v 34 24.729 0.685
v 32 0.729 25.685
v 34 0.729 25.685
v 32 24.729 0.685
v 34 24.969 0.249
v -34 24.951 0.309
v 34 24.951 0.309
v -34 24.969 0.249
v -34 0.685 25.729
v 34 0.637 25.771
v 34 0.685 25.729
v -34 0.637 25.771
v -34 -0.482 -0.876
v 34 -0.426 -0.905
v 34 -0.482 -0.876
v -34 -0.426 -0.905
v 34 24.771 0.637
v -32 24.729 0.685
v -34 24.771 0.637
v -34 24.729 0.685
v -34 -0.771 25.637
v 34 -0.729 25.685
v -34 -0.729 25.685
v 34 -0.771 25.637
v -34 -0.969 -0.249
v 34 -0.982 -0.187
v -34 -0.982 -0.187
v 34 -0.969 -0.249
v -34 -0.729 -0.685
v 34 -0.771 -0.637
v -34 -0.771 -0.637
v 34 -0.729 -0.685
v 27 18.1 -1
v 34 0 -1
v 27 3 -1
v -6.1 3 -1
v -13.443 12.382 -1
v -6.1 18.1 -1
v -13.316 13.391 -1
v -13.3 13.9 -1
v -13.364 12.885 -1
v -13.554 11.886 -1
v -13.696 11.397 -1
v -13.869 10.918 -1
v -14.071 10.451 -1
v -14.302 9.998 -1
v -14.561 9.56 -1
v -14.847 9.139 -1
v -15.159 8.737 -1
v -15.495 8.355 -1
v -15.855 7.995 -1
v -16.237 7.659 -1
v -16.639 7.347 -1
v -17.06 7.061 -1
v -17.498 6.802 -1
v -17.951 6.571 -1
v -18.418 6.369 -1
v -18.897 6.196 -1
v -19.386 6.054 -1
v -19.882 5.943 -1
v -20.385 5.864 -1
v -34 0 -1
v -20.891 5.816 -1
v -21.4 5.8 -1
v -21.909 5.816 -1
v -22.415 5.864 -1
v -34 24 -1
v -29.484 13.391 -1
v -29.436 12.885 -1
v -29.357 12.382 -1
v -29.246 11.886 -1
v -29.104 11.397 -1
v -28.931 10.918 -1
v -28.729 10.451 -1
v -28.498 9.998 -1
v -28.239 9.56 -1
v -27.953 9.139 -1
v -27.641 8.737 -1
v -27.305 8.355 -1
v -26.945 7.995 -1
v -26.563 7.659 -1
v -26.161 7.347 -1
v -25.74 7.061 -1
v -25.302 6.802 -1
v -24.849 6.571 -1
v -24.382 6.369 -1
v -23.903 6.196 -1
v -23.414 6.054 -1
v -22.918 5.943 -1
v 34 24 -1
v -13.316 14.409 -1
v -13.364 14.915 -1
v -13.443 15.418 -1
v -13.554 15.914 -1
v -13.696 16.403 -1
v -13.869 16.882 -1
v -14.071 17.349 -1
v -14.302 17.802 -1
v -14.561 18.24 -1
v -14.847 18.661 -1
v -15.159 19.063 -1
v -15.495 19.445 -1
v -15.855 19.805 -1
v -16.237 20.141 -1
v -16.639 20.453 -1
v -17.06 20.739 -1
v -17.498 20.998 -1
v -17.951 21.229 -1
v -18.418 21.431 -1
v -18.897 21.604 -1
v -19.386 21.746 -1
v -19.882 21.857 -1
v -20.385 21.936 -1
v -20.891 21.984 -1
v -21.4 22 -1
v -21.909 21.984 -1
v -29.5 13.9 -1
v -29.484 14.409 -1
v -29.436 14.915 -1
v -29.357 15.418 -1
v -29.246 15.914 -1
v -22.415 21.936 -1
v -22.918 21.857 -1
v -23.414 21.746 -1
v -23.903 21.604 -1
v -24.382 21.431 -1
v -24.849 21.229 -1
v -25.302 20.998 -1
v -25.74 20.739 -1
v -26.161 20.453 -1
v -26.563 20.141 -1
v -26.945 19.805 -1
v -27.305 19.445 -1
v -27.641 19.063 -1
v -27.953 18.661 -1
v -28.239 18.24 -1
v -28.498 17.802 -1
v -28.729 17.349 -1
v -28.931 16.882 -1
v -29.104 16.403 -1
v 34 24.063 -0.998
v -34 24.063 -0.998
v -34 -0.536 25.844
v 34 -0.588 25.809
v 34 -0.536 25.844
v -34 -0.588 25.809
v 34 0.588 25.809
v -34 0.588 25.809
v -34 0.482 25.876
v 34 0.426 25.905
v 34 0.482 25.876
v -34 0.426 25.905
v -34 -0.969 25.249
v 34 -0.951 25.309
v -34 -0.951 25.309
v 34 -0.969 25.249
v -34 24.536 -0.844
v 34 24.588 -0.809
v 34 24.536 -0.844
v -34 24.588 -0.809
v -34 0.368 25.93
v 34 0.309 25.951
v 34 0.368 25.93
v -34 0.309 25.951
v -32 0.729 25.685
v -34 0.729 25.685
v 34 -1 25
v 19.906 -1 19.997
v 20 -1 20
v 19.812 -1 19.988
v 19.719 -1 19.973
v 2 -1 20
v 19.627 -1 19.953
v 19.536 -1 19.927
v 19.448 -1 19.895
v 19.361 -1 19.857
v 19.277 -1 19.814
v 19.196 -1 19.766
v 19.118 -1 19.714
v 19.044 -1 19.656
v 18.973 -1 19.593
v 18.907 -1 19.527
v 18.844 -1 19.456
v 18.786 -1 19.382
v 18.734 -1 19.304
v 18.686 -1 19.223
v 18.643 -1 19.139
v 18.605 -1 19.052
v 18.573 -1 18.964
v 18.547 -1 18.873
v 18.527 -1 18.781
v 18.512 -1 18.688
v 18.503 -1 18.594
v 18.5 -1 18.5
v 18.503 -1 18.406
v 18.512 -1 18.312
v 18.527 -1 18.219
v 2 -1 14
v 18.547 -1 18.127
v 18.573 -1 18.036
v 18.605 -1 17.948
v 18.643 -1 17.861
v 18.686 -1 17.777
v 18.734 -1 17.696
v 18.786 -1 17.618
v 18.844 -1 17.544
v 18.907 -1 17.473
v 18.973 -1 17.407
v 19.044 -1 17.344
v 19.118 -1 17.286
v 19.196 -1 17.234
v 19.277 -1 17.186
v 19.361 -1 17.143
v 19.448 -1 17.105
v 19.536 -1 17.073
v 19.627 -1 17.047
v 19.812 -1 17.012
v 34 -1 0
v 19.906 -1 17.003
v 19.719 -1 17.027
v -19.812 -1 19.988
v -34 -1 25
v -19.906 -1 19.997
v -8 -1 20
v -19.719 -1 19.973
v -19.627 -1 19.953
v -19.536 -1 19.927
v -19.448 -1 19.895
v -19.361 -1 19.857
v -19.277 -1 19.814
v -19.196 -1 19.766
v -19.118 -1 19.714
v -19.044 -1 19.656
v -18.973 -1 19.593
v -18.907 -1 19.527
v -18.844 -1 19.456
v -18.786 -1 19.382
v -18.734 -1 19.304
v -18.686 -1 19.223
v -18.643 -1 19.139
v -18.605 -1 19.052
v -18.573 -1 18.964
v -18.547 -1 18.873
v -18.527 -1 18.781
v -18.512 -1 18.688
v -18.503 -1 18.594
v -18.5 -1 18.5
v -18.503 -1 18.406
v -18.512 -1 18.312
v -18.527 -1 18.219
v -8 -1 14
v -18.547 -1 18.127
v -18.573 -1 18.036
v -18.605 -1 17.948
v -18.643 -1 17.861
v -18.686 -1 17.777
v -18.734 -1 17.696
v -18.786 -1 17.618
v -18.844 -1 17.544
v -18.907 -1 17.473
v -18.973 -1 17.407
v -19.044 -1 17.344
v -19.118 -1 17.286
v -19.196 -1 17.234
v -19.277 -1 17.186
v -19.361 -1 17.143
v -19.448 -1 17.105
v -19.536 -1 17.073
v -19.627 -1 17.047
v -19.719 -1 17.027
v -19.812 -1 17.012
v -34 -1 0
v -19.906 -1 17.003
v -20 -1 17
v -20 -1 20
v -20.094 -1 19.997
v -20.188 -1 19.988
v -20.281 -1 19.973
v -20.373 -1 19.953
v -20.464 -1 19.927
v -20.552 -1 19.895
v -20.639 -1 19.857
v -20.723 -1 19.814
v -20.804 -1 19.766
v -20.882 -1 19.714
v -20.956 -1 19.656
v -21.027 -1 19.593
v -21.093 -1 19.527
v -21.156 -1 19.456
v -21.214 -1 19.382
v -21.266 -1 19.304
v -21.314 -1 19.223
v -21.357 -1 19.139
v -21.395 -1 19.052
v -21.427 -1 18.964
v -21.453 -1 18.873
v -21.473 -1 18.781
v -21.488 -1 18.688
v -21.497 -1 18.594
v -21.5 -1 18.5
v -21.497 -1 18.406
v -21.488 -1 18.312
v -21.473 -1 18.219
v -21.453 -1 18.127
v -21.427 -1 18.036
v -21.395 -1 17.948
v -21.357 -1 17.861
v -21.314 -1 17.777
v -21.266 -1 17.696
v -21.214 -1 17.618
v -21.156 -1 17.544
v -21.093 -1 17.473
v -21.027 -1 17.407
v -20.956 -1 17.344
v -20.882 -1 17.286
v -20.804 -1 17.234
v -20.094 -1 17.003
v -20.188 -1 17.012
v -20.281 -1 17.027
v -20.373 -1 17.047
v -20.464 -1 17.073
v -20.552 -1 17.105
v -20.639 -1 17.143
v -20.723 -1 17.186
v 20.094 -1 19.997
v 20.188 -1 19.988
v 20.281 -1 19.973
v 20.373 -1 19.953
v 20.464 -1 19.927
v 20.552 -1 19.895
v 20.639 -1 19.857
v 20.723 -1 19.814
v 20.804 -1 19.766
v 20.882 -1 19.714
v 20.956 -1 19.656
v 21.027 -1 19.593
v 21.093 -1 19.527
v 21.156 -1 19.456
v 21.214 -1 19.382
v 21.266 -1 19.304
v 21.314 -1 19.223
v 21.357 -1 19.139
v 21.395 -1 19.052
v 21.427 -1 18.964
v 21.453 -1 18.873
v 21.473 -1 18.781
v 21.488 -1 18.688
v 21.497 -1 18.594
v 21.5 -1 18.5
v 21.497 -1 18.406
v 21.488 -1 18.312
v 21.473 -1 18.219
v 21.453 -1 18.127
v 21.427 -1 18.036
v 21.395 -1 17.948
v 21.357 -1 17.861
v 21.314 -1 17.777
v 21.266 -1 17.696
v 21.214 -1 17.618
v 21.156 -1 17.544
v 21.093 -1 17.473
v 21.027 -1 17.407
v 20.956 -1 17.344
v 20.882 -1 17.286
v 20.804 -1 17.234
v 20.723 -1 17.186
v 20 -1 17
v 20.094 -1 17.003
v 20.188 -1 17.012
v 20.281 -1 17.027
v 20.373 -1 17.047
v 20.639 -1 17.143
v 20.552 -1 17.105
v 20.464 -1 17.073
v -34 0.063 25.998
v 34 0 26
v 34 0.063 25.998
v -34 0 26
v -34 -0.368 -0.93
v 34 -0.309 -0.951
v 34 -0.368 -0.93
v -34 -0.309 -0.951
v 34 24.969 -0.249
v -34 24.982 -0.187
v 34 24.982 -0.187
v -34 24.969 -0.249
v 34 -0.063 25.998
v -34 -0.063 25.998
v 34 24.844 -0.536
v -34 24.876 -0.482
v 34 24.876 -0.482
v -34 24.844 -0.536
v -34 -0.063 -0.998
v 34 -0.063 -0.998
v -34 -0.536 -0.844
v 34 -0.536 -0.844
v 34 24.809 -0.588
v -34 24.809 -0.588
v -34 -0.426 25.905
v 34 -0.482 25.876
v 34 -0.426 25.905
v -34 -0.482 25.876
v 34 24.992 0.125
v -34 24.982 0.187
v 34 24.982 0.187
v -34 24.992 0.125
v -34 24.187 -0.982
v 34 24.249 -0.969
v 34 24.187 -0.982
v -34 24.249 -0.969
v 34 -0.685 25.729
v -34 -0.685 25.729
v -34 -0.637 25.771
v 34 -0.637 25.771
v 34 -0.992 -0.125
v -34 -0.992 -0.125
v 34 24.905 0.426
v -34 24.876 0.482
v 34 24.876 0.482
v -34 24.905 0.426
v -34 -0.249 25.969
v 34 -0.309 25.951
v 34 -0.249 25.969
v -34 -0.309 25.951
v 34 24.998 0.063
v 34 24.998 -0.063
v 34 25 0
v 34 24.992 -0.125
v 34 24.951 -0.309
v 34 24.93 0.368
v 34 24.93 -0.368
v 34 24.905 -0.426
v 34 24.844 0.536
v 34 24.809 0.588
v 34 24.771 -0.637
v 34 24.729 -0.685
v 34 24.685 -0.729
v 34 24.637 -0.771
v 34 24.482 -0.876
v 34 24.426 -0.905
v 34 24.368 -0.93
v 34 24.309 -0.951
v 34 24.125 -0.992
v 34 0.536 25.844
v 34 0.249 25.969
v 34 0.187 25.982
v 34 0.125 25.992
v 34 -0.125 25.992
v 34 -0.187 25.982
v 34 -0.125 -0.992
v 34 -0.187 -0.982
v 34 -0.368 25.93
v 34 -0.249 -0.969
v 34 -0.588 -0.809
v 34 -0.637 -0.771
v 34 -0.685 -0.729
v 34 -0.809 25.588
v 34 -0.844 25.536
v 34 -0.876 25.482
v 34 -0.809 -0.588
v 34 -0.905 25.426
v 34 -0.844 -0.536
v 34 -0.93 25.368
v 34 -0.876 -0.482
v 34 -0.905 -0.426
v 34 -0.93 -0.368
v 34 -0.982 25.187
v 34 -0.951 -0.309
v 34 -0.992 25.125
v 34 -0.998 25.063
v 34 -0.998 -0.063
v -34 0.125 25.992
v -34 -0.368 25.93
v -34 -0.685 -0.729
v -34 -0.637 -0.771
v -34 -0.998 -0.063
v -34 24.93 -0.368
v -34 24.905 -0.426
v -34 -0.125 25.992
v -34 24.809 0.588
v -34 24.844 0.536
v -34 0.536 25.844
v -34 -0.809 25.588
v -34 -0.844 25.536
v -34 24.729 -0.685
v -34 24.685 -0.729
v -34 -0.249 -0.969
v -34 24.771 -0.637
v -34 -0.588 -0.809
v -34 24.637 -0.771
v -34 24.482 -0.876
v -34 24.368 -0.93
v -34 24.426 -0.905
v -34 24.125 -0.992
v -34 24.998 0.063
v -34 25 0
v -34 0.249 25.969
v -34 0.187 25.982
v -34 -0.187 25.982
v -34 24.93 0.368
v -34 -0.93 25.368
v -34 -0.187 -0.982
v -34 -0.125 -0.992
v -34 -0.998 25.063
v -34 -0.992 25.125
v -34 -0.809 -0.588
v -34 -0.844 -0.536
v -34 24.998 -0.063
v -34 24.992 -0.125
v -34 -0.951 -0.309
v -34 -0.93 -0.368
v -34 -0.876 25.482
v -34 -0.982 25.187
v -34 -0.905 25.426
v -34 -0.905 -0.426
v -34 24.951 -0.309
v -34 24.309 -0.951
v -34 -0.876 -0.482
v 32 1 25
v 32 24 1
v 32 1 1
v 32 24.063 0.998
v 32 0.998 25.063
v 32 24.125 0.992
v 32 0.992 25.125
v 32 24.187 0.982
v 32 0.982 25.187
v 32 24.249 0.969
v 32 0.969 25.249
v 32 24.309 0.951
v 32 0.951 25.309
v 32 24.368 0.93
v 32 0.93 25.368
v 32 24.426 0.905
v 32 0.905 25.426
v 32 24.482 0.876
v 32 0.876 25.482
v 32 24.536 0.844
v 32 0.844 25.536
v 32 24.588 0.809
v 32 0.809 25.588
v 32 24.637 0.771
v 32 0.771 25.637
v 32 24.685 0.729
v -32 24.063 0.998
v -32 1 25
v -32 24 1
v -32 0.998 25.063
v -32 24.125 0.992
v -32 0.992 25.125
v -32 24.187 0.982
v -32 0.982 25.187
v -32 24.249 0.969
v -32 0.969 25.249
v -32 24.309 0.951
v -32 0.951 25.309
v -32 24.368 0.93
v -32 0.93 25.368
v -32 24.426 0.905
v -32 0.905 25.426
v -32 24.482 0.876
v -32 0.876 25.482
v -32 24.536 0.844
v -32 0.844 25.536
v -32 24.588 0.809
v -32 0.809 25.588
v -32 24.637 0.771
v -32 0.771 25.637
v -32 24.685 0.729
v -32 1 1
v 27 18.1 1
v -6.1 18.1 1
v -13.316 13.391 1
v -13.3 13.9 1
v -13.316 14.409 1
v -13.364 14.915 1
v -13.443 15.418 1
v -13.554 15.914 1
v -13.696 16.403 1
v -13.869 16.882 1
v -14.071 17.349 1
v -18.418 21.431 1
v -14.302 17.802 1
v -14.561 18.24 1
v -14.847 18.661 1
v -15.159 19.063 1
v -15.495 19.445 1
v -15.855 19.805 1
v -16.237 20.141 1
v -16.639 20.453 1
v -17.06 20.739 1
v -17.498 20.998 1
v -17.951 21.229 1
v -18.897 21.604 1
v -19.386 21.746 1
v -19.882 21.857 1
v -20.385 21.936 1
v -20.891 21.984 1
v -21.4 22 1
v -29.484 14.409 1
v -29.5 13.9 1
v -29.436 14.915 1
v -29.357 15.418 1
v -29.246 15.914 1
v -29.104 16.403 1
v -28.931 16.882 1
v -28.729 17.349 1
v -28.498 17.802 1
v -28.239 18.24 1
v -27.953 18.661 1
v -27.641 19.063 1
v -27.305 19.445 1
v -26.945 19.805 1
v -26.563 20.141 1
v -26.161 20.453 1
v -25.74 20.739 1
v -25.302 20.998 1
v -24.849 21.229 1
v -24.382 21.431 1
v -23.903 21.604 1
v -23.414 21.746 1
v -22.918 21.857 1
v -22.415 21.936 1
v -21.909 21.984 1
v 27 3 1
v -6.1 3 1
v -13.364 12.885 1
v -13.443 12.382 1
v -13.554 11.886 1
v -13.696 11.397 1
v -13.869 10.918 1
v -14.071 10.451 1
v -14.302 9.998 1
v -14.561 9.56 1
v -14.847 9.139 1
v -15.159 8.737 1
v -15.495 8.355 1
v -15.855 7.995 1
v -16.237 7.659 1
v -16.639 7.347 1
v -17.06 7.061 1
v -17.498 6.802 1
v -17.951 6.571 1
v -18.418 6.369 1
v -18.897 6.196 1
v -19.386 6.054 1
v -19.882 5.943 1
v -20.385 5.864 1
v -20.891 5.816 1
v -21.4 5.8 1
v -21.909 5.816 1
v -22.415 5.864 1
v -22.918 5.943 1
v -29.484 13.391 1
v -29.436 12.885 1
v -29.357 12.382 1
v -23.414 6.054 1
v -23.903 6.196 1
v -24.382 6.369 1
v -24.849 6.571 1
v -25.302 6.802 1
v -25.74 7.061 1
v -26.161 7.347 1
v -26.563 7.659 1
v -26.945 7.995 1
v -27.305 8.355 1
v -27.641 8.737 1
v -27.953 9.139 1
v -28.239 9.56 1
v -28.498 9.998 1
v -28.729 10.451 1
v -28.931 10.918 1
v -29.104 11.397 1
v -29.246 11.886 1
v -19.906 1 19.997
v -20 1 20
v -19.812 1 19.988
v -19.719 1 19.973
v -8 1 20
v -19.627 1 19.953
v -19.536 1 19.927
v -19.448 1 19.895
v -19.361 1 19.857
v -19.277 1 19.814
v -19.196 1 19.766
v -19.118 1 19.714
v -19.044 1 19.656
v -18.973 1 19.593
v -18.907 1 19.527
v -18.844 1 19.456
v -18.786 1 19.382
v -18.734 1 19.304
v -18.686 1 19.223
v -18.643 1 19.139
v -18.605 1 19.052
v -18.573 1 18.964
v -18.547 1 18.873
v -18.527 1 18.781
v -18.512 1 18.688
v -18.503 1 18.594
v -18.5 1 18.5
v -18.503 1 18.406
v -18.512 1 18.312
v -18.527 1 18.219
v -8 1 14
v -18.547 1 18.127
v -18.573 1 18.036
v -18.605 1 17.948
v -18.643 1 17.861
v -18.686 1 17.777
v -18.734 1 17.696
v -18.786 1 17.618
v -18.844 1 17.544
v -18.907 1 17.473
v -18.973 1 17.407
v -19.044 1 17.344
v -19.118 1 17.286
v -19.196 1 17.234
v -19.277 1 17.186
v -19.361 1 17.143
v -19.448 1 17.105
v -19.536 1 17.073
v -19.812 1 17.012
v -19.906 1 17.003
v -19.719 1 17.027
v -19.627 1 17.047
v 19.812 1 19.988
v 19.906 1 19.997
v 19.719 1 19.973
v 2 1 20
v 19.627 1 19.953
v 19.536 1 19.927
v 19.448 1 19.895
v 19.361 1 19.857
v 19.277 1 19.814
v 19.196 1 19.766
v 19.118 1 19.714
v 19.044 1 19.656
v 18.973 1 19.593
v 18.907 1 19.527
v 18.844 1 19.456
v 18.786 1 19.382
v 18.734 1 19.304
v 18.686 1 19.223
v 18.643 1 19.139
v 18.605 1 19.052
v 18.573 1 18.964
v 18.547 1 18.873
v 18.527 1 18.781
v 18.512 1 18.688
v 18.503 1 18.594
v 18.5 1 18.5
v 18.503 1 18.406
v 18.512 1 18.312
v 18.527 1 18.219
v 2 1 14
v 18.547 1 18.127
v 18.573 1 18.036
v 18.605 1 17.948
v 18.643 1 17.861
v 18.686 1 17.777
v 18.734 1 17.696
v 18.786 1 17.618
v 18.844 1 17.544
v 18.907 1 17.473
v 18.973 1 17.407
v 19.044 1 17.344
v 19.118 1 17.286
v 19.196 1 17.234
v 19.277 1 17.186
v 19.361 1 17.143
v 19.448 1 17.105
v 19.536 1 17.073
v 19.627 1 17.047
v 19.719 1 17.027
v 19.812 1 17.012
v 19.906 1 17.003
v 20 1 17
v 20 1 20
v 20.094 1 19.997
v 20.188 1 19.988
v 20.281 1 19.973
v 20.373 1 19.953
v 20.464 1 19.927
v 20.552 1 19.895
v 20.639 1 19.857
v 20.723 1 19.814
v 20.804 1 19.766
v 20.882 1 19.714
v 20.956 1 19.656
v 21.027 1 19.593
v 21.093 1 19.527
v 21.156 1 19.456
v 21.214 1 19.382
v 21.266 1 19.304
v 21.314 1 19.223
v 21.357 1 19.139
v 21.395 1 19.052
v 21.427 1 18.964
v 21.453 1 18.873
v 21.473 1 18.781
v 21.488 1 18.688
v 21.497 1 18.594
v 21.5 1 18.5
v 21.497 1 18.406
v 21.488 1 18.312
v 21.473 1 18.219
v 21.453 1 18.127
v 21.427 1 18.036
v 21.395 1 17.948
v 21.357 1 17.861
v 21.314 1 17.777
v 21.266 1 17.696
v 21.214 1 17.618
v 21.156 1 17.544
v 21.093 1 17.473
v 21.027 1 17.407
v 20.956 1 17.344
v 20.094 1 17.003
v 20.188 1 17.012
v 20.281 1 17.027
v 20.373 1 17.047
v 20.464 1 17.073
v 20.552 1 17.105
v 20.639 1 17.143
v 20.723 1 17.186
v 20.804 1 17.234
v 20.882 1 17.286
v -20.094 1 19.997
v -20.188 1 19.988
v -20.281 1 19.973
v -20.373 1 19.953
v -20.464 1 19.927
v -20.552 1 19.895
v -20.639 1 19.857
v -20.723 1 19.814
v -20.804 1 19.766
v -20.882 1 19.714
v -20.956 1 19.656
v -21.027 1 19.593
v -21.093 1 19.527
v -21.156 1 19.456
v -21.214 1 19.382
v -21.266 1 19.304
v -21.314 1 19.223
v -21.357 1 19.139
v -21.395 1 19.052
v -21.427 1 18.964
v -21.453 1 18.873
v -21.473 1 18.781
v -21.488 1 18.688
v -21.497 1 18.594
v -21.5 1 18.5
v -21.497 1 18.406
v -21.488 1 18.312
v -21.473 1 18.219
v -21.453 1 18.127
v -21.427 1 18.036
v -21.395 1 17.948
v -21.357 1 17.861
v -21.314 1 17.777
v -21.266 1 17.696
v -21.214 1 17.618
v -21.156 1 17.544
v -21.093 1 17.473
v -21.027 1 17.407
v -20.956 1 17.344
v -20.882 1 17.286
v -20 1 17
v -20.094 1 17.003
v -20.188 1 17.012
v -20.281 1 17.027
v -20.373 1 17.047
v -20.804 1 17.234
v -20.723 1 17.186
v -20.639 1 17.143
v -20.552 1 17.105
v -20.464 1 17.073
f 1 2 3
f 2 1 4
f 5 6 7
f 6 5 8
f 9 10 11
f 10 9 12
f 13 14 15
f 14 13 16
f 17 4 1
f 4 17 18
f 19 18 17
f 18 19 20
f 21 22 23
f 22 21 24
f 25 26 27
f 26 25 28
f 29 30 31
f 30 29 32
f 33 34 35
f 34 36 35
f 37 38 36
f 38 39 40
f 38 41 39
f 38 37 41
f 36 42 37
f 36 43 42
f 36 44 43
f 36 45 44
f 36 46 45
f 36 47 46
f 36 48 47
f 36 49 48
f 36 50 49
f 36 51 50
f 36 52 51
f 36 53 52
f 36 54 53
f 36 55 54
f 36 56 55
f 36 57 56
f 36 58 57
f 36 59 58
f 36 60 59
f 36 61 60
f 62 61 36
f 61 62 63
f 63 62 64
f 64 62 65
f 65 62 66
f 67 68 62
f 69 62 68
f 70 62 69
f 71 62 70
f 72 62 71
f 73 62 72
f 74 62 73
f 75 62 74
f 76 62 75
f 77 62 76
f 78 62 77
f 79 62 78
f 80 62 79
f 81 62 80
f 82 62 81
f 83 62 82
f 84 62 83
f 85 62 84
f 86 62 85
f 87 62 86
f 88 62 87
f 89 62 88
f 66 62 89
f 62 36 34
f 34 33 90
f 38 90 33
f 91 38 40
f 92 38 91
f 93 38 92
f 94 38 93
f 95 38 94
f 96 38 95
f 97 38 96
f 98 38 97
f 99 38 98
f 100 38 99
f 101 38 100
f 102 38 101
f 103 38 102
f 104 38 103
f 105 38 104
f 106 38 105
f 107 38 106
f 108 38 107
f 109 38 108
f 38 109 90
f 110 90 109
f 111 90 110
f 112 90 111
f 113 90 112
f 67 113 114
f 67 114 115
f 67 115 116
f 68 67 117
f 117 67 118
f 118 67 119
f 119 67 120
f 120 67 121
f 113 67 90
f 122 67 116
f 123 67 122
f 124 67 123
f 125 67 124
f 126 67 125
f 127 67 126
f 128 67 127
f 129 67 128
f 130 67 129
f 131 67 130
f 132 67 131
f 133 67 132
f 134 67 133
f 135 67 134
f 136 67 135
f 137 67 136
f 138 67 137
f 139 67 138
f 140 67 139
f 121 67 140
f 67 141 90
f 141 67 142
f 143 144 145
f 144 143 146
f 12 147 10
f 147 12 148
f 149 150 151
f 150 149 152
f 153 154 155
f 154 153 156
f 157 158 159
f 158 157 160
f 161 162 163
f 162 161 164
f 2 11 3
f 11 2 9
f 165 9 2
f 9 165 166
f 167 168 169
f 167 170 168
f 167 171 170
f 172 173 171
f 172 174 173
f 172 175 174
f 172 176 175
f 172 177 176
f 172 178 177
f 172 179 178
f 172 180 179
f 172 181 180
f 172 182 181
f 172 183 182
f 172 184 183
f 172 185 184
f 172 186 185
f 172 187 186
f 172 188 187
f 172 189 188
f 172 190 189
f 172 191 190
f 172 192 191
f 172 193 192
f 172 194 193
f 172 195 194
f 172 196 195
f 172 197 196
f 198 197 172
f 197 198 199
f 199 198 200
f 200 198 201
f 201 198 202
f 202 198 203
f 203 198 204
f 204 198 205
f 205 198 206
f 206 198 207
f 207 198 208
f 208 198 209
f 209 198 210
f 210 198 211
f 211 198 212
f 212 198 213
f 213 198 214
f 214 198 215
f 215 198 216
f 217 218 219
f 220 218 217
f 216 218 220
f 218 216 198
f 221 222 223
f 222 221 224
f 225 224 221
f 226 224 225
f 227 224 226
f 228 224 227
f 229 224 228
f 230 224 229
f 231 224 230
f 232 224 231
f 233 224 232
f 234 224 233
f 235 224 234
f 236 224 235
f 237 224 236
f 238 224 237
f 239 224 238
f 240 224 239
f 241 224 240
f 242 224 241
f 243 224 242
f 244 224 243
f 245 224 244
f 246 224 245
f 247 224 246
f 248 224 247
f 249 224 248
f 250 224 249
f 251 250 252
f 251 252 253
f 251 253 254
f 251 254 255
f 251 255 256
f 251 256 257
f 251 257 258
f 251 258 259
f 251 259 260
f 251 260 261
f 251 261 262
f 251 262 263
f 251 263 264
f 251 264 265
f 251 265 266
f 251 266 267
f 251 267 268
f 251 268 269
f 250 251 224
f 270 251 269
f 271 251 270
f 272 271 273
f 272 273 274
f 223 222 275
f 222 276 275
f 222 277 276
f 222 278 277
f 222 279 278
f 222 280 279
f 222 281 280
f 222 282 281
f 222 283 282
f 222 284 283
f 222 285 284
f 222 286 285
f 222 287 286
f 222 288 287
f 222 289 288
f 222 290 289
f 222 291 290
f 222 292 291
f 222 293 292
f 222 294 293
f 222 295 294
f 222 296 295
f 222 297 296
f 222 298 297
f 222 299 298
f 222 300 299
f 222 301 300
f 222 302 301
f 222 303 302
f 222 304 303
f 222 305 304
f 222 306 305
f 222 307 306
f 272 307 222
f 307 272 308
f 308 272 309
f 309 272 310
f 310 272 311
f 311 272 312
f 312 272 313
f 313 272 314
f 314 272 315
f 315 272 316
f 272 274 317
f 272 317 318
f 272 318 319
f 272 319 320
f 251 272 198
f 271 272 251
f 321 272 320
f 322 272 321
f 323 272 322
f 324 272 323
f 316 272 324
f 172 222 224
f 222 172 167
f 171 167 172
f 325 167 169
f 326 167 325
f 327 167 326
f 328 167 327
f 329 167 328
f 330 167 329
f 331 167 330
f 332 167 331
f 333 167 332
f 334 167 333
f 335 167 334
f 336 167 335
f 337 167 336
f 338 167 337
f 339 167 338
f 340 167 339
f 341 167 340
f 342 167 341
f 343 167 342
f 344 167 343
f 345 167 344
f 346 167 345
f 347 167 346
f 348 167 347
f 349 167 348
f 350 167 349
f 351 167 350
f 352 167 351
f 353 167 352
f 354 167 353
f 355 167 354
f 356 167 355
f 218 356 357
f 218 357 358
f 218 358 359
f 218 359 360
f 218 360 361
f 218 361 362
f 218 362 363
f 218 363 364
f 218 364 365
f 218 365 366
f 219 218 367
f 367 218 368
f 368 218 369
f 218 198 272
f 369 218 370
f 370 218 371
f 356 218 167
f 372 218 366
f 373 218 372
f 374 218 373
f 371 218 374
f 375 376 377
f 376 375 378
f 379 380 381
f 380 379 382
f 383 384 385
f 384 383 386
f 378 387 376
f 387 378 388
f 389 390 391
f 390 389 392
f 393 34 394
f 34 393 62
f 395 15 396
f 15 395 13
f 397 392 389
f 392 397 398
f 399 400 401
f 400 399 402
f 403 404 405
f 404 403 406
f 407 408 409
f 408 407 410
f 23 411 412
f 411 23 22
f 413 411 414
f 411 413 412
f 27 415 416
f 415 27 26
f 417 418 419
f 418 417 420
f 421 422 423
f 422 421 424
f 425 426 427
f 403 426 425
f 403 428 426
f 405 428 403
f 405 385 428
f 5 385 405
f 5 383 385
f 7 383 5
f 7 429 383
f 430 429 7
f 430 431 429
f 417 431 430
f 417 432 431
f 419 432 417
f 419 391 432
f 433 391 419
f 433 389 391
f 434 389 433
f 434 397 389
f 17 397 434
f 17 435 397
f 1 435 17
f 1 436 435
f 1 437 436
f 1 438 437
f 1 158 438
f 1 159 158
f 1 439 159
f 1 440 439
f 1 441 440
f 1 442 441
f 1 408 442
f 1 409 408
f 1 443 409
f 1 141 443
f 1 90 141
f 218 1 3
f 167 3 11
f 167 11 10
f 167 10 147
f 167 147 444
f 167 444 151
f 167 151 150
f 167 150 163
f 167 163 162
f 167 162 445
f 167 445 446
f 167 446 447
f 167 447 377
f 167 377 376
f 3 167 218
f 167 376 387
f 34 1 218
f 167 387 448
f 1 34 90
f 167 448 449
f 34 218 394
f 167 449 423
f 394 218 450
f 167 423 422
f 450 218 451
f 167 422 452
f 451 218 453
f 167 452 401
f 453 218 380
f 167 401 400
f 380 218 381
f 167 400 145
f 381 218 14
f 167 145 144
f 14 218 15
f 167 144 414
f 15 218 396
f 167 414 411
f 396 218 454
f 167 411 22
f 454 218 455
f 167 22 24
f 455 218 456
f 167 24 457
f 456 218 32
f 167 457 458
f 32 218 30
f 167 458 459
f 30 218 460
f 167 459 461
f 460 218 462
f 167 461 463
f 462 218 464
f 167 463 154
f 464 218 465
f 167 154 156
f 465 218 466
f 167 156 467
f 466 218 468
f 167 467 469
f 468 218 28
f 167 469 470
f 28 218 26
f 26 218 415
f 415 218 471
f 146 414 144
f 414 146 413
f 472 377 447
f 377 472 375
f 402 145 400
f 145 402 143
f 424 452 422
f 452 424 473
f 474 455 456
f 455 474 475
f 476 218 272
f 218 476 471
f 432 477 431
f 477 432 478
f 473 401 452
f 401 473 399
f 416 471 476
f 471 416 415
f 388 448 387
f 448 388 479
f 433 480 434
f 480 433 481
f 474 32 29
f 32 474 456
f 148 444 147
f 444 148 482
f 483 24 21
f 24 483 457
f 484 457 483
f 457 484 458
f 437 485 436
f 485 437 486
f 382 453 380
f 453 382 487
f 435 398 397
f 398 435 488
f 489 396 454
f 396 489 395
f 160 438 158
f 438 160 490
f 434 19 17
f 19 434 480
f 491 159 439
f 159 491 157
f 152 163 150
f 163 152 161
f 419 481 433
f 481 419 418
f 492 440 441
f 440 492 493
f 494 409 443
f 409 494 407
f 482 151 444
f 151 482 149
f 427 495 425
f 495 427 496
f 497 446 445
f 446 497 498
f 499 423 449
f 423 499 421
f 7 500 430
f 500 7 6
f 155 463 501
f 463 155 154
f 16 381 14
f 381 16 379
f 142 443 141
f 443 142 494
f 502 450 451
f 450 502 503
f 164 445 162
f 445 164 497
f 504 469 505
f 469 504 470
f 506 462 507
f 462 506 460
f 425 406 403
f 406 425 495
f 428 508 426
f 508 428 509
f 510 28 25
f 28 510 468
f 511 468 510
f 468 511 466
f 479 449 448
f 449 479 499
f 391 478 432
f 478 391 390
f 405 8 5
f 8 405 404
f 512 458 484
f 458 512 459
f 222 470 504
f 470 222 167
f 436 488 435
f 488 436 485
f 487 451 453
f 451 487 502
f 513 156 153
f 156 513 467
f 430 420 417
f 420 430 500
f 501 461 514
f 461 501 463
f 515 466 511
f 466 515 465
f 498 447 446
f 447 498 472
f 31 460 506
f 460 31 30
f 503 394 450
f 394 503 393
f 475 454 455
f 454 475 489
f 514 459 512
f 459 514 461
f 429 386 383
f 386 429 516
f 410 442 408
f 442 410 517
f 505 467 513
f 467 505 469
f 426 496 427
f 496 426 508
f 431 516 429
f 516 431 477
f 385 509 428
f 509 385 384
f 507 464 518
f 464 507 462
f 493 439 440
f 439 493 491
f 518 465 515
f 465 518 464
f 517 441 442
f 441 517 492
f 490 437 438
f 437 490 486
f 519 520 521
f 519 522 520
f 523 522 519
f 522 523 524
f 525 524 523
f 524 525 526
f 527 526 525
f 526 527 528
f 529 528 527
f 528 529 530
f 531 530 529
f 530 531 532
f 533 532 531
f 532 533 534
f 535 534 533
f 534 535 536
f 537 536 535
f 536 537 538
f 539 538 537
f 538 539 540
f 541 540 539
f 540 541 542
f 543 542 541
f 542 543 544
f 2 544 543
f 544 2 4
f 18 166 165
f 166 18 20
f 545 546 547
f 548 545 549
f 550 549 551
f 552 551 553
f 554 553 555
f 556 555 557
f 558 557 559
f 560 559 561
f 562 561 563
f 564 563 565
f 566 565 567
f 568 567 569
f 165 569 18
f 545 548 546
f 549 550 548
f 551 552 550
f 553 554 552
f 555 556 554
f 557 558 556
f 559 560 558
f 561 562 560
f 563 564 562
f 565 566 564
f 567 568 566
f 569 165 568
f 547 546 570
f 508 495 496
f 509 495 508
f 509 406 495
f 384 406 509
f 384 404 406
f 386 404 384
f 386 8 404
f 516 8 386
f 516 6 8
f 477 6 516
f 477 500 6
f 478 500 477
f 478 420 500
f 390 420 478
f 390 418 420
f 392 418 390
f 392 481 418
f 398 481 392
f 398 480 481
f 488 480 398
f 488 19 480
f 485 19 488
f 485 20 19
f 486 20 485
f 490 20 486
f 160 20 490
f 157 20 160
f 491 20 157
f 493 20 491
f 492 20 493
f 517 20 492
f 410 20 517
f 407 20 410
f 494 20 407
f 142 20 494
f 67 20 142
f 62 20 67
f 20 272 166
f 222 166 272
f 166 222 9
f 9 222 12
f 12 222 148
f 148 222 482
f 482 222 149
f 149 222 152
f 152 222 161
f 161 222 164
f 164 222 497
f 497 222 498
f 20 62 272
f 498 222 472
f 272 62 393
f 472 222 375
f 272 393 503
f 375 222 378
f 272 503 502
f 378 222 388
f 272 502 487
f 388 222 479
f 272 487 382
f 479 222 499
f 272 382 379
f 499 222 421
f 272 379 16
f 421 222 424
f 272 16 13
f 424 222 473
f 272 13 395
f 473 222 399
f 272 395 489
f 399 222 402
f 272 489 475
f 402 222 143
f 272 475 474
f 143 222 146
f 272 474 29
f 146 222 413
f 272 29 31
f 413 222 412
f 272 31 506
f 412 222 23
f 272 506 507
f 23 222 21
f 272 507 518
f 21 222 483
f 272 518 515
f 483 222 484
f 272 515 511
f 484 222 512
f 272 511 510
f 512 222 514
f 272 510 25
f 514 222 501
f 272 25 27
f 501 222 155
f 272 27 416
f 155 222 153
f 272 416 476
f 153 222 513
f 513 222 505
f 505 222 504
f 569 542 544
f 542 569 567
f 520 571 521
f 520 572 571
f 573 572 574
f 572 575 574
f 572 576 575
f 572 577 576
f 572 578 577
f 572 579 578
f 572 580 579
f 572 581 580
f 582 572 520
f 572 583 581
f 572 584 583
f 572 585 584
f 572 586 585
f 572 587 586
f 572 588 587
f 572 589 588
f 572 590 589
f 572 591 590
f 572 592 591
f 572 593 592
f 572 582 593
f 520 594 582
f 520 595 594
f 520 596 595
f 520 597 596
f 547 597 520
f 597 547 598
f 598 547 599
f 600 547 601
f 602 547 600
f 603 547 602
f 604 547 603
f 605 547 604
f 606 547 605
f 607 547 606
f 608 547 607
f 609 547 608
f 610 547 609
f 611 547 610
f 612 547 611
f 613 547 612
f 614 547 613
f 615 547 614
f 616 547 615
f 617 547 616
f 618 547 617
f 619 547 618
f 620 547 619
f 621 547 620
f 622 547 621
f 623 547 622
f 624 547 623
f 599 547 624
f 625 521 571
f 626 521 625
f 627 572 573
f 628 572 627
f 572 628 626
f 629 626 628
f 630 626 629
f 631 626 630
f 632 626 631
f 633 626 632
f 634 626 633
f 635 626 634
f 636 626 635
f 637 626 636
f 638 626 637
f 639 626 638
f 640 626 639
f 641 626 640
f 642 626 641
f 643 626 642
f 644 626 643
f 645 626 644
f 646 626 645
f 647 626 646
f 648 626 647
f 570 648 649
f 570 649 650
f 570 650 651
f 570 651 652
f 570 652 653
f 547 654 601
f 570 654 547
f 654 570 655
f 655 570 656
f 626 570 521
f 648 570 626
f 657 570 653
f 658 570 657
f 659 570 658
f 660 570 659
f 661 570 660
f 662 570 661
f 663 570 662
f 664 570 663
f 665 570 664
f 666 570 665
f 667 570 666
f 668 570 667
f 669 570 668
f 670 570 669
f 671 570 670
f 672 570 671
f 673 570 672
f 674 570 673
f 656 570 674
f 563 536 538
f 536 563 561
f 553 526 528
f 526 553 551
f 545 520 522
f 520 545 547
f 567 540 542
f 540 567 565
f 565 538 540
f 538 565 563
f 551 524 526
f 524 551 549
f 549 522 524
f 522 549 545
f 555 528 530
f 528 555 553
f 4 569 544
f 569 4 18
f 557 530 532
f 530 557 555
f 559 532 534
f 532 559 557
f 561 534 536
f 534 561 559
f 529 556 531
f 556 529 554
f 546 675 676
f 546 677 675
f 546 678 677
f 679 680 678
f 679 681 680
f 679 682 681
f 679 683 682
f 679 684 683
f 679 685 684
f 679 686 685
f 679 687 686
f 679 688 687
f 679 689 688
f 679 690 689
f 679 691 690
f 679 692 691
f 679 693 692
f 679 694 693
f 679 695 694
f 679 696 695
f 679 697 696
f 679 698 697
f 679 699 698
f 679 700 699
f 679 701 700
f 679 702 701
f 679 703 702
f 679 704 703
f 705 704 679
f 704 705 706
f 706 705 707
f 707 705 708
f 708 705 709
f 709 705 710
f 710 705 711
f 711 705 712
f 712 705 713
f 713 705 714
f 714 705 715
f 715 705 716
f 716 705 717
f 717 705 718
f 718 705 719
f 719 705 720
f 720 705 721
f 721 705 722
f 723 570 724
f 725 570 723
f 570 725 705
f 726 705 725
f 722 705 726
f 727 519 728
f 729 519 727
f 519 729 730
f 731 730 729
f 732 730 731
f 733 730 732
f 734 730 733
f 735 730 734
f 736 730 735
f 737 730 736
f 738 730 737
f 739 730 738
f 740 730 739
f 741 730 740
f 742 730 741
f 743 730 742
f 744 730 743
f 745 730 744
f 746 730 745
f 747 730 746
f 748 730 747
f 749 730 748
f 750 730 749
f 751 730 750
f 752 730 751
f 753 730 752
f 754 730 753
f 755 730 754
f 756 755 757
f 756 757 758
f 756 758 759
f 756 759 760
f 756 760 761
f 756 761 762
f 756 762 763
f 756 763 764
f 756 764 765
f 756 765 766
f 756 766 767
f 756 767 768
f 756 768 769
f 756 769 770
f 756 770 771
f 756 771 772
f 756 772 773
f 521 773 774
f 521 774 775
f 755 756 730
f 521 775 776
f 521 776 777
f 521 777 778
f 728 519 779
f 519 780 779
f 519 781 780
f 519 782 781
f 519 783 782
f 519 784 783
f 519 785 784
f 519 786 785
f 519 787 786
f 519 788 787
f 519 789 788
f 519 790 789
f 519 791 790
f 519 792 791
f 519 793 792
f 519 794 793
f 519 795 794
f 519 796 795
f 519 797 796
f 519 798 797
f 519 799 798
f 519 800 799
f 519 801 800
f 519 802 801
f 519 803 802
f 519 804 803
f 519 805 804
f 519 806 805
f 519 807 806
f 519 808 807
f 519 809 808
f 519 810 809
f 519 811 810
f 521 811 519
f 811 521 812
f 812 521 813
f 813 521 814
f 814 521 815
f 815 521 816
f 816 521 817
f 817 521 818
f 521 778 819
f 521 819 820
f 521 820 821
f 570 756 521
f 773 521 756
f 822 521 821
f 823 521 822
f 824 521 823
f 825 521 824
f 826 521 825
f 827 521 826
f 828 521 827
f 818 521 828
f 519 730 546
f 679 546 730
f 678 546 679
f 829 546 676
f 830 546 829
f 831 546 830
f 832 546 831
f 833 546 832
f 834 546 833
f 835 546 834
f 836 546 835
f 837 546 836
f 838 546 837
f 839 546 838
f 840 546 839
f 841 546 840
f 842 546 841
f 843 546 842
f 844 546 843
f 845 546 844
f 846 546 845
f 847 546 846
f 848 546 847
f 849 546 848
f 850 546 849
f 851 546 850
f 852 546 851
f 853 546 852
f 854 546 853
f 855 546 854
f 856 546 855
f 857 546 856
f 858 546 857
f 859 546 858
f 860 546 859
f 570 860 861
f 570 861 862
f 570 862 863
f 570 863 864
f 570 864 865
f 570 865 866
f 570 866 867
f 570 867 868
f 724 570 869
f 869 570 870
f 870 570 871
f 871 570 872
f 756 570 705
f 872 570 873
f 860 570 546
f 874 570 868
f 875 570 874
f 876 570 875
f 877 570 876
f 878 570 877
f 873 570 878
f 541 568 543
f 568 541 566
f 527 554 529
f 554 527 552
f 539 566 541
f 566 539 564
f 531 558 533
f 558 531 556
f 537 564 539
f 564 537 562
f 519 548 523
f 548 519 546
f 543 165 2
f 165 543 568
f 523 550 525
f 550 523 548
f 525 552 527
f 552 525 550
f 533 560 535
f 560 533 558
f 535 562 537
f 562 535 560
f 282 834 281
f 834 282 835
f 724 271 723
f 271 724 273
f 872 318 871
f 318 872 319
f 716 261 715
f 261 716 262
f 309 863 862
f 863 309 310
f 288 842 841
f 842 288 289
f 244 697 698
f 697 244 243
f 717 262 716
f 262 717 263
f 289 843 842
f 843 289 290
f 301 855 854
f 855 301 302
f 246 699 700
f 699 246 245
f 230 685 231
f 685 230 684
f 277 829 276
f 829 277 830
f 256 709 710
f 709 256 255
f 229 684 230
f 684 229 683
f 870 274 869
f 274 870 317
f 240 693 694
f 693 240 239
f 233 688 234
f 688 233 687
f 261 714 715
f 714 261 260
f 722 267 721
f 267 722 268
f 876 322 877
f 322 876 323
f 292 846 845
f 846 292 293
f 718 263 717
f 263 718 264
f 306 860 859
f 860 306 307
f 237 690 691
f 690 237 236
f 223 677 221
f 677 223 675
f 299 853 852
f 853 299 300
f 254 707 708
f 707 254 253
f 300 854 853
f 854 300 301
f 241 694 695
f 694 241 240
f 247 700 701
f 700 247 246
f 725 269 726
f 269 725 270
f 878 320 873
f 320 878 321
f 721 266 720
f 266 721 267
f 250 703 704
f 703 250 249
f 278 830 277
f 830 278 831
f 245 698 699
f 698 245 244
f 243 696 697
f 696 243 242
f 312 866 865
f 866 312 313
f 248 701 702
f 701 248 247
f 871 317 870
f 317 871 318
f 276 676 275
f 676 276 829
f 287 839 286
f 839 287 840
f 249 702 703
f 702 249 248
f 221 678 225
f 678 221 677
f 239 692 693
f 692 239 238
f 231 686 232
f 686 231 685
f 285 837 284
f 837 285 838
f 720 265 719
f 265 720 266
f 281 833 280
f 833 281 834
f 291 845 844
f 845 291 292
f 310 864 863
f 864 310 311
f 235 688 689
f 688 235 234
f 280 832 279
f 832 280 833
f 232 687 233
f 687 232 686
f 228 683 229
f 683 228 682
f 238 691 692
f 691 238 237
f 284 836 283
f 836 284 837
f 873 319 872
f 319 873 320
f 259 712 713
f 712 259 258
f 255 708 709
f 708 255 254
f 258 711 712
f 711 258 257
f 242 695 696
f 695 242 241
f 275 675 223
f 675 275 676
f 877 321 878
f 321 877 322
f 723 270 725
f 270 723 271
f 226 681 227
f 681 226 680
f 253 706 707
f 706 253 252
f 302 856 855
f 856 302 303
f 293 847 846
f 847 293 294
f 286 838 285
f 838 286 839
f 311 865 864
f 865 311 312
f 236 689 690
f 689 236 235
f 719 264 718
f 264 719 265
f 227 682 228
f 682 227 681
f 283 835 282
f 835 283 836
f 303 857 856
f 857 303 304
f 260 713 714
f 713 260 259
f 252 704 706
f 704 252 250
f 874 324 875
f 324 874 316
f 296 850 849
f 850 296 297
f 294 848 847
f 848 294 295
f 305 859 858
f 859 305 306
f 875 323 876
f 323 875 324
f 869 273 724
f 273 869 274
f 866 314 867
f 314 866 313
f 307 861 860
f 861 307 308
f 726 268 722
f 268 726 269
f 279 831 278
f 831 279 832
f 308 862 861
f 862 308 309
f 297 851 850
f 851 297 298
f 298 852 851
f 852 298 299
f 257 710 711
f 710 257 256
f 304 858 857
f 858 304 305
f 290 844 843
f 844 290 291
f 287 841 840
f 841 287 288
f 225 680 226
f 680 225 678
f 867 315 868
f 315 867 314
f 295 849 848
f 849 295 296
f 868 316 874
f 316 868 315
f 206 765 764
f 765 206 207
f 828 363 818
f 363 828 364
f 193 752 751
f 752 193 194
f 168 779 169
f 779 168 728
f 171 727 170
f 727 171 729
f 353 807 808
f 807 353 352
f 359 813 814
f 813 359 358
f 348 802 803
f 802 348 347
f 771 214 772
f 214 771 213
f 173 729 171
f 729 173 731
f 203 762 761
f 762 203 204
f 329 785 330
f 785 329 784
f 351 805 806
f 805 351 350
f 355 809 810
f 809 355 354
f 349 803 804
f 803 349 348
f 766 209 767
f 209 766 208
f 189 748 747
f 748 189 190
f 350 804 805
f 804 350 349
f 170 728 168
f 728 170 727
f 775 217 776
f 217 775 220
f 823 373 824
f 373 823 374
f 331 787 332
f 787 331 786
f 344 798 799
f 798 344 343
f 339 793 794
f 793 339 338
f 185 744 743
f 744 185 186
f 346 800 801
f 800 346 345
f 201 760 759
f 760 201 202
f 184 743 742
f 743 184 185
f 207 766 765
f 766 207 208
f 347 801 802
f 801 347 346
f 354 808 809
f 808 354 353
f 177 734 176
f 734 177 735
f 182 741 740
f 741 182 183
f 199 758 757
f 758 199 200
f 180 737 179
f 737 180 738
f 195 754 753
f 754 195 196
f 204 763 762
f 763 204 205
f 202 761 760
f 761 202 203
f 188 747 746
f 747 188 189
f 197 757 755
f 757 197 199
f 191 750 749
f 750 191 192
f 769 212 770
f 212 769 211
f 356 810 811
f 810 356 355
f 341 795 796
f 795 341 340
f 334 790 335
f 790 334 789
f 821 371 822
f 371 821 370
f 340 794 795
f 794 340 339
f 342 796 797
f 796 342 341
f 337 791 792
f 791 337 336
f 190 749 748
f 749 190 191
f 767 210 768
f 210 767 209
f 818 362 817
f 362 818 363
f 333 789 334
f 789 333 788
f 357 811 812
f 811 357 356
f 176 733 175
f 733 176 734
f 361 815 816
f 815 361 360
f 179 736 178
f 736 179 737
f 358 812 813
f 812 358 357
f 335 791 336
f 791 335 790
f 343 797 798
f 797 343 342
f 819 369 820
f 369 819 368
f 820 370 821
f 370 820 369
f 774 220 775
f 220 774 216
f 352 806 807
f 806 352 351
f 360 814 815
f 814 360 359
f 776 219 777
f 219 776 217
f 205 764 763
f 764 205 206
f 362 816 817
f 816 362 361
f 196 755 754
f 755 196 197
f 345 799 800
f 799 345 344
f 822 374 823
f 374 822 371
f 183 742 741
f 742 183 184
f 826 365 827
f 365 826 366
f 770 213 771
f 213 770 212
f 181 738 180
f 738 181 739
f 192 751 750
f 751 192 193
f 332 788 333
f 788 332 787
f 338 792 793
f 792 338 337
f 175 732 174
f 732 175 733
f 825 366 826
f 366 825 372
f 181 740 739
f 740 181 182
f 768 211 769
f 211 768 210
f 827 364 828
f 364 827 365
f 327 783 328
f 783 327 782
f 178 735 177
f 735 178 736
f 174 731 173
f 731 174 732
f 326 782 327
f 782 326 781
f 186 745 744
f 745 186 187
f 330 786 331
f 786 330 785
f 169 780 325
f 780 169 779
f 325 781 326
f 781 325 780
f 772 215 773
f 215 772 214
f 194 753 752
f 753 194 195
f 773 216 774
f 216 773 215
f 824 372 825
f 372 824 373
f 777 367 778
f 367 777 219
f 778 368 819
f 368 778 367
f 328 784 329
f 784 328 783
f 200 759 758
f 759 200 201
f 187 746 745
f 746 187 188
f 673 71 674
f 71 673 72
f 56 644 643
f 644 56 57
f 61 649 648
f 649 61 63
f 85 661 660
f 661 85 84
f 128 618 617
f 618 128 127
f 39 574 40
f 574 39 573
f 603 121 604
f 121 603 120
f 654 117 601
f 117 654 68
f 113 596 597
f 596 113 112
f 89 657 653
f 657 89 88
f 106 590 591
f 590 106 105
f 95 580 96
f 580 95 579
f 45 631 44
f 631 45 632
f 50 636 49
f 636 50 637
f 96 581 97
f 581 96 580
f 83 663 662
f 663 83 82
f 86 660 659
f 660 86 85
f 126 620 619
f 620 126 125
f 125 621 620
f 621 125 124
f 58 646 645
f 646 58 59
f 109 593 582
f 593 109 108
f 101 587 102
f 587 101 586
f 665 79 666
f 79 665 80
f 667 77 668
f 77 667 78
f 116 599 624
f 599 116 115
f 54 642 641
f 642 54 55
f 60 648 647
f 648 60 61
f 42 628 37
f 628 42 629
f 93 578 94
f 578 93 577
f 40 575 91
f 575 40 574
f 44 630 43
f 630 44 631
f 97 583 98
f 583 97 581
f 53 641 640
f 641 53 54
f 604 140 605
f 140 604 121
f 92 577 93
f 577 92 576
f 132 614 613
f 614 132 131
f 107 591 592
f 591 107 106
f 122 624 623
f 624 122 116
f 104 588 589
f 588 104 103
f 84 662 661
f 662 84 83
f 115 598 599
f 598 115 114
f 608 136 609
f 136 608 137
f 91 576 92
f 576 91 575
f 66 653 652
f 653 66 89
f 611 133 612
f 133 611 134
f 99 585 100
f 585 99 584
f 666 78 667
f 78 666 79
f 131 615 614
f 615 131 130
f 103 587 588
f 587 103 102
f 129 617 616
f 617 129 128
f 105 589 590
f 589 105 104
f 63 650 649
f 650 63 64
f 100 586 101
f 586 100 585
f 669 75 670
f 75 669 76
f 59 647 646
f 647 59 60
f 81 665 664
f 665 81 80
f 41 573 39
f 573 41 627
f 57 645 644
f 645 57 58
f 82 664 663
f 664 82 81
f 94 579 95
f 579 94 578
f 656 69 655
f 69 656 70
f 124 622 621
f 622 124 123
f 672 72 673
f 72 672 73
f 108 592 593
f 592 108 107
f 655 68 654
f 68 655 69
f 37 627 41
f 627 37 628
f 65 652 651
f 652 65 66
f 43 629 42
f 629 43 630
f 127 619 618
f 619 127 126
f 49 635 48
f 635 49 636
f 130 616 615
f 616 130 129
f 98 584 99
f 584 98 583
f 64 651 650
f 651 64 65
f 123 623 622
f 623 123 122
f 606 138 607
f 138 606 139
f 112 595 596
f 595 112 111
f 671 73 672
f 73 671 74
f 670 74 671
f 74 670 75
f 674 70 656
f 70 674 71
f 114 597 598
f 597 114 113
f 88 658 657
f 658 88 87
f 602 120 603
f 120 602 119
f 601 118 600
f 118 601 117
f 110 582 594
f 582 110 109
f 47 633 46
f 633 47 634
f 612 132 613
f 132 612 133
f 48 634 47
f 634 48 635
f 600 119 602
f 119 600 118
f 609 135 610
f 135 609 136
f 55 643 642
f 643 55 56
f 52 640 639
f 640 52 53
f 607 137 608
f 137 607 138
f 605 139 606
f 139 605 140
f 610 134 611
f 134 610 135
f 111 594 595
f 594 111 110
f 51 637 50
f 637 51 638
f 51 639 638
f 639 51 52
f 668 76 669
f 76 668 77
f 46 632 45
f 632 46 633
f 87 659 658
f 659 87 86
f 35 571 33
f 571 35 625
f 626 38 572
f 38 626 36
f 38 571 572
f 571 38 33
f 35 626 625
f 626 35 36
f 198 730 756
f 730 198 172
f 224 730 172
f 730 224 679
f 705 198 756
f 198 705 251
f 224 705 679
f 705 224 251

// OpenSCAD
$fn=100;
width = 85-15;
length = 26;
depth = 25;

corner_r = 2;
wall_th = 2;

lid_depth = 0;
lid_width = 0;

M3_screw_diameter=3;

rubber_band_size=2.1;
attach_h=15;

translation = 50; //Oddialovanie casti 

module triangle(x1,y1,z1,x2,y2,z2,x3,y3,z3,h){    
    hull(){
    translate([x1,y1,z1]){
        rotate([0,90,0]){
        cylinder(r=h,h=2*h,center=true);
        }}
    translate([x2,y2,z2]){
        rotate([0,90,0]){
        cylinder(r=h,h=2*h,center=true);
        }}
    translate([x3,y3,z3]){
        rotate([0,90,0]){
        cylinder(r=h,h=2*h,center=true);
        }}
    }
}
module shelf(width,length,depth,wall_th){
x1_1=width/2-wall_th;
y1_1=length-wall_th;
z1_1=0;
x2_1=width/2-wall_th;
y2_1=0;
z2_1=0;
x3_1=width/2-wall_th;
y3_1=0;
z3_1=depth;
h=wall_th/2;
x1_2=-(width/2-wall_th);
y1_2=length-wall_th;
z1_2=0;
x2_2=-(width/2-wall_th);
y2_2=0;
z2_2=0;
x3_2=-(width/2-wall_th);
y3_2=0;
z3_2=depth;
triangle(x1=x1_1,
         y1=y1_1,
         z1=z1_1,
         x2=x2_1,
         y2=y2_1,
         z2=z2_1,
         x3=x3_1,
         y3=y3_1,
         z3=z3_1,h=wall_th/2);
triangle(x1=x1_2,
         y1=y1_2,
         z1=z1_2,
         x2=x2_2,
         y2=y2_2,
         z2=z2_2,
         x3=x3_2,
         y3=y3_2,
         z3=z3_2,h=wall_th/2);
hull(){
    triangle(x1=x1_1,
             y1=y1_1,
             z1=z1_1,
             x2=x1_2,
             y2=y1_2,
             z2=z1_2,
             x3=x2_1,
             y3=y2_1,
             z3=z2_1,h=wall_th/2);
    triangle(x1=x1_1,
             y1=y1_1,
             z1=z1_1,
             x2=x1_2,
             y2=y1_2,
             z2=z1_2,
             x3=x2_2,
             y3=y2_2,
             z3=z2_2,h=wall_th/2);
}

hull(){
    triangle(x1=x2_1,
             y1=y2_1,
             z1=z2_1,
             x2=x3_1,
             y2=y3_1,
             z2=z3_1,
             x3=x2_2,
             y3=y2_2,
             z3=z2_2,h=wall_th/2);
    triangle(x1=x2_1,
             y1=y2_1,
             z1=z2_1,
             x2=x3_1,
             y2=y3_1,
             z2=z3_1,
             x3=x3_2,
             y3=y3_2,
             z3=z3_2,h=wall_th/2);
}
}


module sensors_box_sensor_part(){
difference(){
union(){
shelf(width, length, depth,wall_th);
/*translate([0,-wall_th-translation, depth+wall_th+1]){
    rotate([0,180,0]){
        shelf(width+2*wall_th+1, length+wall_th, depth-wall_th,wall_th);
        }
}*/

}
//hole for ultrasonic sensor
translate([-width/2+16.2/2+3+0.5+wall_th, length-16.2/2-2-wall_th,-5]){
cylinder(r=16.2/2,h=wall_th+5);
}

//hole for lidar

translate([width/2-5-wall_th-33.1-1,length-wall_th-16-5,-2]){
cube([33.1,15.1,wall_th+5]);
}

//hole for cables
translate([-width/2+wall_th+10+15,-150,wall_th+12]){
//cube([wall_th+2,10,6]);
cube([10,wall_th+500,6]);
}

for(x=[-20,20]) //diery pre sruby
    translate([x,300,attach_h+7/2]){
                rotate([90,0,0]){
                    cylinder(r=M3_screw_diameter/2,h=500); 
            }}
}
}


module sensors_box_upper_part(){
difference(){
union(){

translate([0,-wall_th-translation, depth+wall_th+1]){
    rotate([0,180,0]){
        shelf(width+2*wall_th+1, length+wall_th, depth-wall_th,wall_th);
        }
}

}

//hole for cables
translate([-width/2+wall_th+10+15,-150,wall_th+12]){
//cube([wall_th+2,10,6]);
cube([10,wall_th+500,6]);
}

for(x=[-20,20]) //diery pre sruby
    translate([x,300,attach_h+7/2]){
                rotate([90,0,0]){
                    cylinder(r=M3_screw_diameter/2,h=500); 
            }}
}
}

//sensors_box_upper_part();
sensors_box_sensor_part();
